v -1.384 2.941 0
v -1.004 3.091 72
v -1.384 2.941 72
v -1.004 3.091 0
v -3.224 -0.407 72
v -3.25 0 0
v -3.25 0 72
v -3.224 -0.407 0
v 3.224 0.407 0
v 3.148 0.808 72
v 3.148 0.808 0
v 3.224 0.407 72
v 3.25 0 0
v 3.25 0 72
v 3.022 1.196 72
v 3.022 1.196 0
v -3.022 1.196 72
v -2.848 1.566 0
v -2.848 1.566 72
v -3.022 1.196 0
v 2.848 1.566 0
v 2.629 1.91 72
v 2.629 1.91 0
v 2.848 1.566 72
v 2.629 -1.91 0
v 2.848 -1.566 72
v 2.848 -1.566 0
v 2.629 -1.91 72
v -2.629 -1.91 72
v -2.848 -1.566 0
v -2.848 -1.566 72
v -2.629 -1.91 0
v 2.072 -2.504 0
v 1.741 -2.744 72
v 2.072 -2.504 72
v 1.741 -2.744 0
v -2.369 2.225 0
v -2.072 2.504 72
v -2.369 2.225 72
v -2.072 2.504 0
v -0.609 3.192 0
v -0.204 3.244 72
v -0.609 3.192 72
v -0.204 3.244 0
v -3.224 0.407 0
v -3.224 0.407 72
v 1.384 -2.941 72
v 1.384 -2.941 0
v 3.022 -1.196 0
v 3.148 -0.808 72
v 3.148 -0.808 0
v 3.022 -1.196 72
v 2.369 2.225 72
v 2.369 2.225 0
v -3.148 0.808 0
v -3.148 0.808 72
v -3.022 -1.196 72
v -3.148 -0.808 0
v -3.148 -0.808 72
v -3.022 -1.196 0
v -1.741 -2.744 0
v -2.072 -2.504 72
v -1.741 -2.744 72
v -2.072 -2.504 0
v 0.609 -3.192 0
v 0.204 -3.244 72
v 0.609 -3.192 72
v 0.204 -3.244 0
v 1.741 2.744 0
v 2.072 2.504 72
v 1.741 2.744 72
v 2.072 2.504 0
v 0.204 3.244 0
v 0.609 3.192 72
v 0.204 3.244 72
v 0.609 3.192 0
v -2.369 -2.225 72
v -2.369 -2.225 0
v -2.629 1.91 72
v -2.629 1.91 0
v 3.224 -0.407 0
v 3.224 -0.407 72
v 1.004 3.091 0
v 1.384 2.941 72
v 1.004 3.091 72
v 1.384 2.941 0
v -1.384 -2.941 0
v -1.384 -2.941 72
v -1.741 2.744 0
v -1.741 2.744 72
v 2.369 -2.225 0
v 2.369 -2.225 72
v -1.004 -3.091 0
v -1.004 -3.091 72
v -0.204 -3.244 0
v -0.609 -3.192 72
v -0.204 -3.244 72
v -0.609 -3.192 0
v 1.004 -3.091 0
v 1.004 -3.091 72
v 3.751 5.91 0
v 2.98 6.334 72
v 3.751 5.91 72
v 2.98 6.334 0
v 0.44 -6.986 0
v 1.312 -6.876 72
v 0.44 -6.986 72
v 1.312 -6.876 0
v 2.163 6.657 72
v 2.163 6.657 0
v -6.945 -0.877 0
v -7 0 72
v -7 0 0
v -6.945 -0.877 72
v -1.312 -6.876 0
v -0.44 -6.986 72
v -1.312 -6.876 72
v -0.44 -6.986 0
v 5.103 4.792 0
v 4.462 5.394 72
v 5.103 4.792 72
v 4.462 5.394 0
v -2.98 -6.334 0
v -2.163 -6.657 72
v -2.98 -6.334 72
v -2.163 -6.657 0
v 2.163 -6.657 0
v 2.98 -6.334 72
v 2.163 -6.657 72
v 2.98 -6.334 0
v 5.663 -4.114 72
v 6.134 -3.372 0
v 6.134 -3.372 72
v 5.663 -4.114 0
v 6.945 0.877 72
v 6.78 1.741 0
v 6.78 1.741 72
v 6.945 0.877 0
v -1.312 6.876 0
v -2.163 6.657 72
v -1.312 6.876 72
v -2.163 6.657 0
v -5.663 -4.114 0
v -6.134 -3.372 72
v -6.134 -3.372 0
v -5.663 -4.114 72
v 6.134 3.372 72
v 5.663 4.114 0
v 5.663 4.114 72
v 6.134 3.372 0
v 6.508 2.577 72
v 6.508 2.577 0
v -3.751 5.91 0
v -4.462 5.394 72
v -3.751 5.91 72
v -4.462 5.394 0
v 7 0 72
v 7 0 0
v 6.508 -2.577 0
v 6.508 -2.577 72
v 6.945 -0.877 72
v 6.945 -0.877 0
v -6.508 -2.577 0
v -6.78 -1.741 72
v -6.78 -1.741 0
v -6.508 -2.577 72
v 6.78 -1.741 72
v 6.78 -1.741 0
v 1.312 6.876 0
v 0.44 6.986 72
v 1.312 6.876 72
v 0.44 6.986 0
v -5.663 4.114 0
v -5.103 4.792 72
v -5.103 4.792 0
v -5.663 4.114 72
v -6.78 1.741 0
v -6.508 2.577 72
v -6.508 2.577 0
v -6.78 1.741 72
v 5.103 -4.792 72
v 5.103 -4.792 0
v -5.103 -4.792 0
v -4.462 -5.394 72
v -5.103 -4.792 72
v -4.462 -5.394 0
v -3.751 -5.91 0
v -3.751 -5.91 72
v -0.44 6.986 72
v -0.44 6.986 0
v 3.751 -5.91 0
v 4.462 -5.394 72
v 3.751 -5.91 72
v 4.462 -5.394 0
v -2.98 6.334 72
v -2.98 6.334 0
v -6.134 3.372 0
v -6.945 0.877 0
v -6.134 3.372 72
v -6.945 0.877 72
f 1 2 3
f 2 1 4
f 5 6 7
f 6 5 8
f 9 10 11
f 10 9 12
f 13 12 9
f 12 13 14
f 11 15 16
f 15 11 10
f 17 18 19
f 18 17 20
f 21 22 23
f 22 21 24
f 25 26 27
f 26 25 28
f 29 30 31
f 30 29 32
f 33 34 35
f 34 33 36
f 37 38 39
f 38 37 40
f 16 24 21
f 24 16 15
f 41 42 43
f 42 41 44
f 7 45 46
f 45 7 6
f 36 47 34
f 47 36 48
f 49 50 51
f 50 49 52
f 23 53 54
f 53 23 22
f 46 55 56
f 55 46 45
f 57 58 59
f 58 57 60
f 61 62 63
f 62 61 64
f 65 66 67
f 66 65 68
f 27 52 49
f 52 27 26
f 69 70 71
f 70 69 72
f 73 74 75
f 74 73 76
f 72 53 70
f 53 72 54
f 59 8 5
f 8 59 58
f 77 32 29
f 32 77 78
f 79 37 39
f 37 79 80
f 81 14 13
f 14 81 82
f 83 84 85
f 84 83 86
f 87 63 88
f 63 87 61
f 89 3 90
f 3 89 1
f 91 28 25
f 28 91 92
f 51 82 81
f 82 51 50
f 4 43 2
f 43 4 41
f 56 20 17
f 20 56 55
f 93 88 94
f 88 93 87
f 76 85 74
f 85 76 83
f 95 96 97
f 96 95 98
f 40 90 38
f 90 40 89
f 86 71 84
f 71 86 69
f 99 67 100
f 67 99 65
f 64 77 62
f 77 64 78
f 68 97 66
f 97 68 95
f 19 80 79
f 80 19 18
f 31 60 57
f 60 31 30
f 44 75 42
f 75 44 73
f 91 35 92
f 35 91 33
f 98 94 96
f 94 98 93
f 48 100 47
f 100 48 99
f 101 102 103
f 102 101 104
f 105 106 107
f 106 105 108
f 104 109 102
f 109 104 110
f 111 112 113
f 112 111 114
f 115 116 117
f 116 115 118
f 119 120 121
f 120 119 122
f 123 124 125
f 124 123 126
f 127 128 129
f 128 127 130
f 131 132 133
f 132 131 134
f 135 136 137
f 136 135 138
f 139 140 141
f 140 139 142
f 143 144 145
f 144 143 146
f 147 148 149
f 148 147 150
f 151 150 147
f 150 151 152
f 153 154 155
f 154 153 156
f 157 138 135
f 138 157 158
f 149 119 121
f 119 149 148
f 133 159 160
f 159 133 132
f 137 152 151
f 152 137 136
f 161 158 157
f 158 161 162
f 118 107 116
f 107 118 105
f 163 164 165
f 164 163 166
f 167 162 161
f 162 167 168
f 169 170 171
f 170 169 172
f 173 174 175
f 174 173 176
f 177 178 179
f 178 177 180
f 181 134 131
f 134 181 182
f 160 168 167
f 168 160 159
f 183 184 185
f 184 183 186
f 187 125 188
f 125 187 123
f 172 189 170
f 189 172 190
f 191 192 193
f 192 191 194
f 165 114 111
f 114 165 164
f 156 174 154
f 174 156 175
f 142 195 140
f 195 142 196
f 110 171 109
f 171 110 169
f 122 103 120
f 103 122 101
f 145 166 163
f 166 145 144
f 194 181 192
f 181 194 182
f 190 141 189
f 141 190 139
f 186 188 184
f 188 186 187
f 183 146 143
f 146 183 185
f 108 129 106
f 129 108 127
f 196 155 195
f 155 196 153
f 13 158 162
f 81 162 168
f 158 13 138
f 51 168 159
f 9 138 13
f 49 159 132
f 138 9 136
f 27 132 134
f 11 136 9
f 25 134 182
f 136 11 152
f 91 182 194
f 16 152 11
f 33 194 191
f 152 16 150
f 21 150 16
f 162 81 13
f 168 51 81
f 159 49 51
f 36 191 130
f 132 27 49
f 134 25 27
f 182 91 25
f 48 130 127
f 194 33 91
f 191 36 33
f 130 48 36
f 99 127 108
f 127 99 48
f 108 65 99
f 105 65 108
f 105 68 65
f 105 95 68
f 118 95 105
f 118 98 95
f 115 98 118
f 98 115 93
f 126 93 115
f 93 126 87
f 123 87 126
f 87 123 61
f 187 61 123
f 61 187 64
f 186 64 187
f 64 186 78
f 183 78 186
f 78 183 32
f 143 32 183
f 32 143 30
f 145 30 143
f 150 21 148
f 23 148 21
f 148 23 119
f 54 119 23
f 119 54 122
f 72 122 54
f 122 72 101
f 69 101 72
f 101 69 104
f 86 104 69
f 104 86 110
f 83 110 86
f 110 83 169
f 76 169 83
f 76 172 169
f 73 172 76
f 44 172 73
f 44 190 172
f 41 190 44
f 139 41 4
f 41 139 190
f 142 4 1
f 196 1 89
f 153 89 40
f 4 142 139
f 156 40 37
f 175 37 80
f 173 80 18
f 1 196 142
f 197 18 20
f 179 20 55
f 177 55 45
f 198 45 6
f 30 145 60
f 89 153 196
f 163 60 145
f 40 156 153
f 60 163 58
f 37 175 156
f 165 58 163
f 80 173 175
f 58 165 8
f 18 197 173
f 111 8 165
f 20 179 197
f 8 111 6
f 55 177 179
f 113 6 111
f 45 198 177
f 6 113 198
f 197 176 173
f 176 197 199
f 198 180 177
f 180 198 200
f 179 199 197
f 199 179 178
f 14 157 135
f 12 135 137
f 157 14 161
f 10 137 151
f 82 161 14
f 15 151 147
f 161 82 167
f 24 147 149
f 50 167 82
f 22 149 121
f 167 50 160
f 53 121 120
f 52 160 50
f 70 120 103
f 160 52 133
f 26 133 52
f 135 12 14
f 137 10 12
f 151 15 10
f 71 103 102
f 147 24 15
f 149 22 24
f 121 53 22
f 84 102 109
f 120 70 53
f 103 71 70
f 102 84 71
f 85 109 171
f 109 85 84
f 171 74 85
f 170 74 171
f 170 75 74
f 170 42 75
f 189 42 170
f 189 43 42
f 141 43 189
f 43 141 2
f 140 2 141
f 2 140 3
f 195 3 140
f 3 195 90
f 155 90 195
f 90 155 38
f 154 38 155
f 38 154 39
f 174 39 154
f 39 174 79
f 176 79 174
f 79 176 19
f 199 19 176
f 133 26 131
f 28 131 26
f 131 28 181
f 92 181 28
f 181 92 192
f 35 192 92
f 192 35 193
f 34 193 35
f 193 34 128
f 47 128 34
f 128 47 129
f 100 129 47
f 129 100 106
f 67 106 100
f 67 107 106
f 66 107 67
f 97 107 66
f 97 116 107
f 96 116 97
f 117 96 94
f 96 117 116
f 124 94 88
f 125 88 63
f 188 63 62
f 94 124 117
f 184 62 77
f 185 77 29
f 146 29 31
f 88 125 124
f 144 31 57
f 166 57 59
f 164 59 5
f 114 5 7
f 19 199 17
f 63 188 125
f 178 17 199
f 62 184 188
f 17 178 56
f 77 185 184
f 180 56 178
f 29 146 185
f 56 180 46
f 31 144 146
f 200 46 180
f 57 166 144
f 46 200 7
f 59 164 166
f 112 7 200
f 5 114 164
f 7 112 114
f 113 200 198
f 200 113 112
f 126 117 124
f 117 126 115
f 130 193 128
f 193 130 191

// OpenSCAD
$fn = 50;


difference() {
	union() {
		cylinder(h = 72, r = 7.0000000000);
	}
	union() {
		translate(v = [0.0000000000, 0.0000000000, -100.0000000000]) {
			cylinder(h = 200, r = 3.2500000000);
		}
		cylinder(h = 72, r = 1.8000000000);
		cylinder(h = 72, r = 1.8000000000);
		cylinder(h = 72, r = 1.8000000000);
	}
}
